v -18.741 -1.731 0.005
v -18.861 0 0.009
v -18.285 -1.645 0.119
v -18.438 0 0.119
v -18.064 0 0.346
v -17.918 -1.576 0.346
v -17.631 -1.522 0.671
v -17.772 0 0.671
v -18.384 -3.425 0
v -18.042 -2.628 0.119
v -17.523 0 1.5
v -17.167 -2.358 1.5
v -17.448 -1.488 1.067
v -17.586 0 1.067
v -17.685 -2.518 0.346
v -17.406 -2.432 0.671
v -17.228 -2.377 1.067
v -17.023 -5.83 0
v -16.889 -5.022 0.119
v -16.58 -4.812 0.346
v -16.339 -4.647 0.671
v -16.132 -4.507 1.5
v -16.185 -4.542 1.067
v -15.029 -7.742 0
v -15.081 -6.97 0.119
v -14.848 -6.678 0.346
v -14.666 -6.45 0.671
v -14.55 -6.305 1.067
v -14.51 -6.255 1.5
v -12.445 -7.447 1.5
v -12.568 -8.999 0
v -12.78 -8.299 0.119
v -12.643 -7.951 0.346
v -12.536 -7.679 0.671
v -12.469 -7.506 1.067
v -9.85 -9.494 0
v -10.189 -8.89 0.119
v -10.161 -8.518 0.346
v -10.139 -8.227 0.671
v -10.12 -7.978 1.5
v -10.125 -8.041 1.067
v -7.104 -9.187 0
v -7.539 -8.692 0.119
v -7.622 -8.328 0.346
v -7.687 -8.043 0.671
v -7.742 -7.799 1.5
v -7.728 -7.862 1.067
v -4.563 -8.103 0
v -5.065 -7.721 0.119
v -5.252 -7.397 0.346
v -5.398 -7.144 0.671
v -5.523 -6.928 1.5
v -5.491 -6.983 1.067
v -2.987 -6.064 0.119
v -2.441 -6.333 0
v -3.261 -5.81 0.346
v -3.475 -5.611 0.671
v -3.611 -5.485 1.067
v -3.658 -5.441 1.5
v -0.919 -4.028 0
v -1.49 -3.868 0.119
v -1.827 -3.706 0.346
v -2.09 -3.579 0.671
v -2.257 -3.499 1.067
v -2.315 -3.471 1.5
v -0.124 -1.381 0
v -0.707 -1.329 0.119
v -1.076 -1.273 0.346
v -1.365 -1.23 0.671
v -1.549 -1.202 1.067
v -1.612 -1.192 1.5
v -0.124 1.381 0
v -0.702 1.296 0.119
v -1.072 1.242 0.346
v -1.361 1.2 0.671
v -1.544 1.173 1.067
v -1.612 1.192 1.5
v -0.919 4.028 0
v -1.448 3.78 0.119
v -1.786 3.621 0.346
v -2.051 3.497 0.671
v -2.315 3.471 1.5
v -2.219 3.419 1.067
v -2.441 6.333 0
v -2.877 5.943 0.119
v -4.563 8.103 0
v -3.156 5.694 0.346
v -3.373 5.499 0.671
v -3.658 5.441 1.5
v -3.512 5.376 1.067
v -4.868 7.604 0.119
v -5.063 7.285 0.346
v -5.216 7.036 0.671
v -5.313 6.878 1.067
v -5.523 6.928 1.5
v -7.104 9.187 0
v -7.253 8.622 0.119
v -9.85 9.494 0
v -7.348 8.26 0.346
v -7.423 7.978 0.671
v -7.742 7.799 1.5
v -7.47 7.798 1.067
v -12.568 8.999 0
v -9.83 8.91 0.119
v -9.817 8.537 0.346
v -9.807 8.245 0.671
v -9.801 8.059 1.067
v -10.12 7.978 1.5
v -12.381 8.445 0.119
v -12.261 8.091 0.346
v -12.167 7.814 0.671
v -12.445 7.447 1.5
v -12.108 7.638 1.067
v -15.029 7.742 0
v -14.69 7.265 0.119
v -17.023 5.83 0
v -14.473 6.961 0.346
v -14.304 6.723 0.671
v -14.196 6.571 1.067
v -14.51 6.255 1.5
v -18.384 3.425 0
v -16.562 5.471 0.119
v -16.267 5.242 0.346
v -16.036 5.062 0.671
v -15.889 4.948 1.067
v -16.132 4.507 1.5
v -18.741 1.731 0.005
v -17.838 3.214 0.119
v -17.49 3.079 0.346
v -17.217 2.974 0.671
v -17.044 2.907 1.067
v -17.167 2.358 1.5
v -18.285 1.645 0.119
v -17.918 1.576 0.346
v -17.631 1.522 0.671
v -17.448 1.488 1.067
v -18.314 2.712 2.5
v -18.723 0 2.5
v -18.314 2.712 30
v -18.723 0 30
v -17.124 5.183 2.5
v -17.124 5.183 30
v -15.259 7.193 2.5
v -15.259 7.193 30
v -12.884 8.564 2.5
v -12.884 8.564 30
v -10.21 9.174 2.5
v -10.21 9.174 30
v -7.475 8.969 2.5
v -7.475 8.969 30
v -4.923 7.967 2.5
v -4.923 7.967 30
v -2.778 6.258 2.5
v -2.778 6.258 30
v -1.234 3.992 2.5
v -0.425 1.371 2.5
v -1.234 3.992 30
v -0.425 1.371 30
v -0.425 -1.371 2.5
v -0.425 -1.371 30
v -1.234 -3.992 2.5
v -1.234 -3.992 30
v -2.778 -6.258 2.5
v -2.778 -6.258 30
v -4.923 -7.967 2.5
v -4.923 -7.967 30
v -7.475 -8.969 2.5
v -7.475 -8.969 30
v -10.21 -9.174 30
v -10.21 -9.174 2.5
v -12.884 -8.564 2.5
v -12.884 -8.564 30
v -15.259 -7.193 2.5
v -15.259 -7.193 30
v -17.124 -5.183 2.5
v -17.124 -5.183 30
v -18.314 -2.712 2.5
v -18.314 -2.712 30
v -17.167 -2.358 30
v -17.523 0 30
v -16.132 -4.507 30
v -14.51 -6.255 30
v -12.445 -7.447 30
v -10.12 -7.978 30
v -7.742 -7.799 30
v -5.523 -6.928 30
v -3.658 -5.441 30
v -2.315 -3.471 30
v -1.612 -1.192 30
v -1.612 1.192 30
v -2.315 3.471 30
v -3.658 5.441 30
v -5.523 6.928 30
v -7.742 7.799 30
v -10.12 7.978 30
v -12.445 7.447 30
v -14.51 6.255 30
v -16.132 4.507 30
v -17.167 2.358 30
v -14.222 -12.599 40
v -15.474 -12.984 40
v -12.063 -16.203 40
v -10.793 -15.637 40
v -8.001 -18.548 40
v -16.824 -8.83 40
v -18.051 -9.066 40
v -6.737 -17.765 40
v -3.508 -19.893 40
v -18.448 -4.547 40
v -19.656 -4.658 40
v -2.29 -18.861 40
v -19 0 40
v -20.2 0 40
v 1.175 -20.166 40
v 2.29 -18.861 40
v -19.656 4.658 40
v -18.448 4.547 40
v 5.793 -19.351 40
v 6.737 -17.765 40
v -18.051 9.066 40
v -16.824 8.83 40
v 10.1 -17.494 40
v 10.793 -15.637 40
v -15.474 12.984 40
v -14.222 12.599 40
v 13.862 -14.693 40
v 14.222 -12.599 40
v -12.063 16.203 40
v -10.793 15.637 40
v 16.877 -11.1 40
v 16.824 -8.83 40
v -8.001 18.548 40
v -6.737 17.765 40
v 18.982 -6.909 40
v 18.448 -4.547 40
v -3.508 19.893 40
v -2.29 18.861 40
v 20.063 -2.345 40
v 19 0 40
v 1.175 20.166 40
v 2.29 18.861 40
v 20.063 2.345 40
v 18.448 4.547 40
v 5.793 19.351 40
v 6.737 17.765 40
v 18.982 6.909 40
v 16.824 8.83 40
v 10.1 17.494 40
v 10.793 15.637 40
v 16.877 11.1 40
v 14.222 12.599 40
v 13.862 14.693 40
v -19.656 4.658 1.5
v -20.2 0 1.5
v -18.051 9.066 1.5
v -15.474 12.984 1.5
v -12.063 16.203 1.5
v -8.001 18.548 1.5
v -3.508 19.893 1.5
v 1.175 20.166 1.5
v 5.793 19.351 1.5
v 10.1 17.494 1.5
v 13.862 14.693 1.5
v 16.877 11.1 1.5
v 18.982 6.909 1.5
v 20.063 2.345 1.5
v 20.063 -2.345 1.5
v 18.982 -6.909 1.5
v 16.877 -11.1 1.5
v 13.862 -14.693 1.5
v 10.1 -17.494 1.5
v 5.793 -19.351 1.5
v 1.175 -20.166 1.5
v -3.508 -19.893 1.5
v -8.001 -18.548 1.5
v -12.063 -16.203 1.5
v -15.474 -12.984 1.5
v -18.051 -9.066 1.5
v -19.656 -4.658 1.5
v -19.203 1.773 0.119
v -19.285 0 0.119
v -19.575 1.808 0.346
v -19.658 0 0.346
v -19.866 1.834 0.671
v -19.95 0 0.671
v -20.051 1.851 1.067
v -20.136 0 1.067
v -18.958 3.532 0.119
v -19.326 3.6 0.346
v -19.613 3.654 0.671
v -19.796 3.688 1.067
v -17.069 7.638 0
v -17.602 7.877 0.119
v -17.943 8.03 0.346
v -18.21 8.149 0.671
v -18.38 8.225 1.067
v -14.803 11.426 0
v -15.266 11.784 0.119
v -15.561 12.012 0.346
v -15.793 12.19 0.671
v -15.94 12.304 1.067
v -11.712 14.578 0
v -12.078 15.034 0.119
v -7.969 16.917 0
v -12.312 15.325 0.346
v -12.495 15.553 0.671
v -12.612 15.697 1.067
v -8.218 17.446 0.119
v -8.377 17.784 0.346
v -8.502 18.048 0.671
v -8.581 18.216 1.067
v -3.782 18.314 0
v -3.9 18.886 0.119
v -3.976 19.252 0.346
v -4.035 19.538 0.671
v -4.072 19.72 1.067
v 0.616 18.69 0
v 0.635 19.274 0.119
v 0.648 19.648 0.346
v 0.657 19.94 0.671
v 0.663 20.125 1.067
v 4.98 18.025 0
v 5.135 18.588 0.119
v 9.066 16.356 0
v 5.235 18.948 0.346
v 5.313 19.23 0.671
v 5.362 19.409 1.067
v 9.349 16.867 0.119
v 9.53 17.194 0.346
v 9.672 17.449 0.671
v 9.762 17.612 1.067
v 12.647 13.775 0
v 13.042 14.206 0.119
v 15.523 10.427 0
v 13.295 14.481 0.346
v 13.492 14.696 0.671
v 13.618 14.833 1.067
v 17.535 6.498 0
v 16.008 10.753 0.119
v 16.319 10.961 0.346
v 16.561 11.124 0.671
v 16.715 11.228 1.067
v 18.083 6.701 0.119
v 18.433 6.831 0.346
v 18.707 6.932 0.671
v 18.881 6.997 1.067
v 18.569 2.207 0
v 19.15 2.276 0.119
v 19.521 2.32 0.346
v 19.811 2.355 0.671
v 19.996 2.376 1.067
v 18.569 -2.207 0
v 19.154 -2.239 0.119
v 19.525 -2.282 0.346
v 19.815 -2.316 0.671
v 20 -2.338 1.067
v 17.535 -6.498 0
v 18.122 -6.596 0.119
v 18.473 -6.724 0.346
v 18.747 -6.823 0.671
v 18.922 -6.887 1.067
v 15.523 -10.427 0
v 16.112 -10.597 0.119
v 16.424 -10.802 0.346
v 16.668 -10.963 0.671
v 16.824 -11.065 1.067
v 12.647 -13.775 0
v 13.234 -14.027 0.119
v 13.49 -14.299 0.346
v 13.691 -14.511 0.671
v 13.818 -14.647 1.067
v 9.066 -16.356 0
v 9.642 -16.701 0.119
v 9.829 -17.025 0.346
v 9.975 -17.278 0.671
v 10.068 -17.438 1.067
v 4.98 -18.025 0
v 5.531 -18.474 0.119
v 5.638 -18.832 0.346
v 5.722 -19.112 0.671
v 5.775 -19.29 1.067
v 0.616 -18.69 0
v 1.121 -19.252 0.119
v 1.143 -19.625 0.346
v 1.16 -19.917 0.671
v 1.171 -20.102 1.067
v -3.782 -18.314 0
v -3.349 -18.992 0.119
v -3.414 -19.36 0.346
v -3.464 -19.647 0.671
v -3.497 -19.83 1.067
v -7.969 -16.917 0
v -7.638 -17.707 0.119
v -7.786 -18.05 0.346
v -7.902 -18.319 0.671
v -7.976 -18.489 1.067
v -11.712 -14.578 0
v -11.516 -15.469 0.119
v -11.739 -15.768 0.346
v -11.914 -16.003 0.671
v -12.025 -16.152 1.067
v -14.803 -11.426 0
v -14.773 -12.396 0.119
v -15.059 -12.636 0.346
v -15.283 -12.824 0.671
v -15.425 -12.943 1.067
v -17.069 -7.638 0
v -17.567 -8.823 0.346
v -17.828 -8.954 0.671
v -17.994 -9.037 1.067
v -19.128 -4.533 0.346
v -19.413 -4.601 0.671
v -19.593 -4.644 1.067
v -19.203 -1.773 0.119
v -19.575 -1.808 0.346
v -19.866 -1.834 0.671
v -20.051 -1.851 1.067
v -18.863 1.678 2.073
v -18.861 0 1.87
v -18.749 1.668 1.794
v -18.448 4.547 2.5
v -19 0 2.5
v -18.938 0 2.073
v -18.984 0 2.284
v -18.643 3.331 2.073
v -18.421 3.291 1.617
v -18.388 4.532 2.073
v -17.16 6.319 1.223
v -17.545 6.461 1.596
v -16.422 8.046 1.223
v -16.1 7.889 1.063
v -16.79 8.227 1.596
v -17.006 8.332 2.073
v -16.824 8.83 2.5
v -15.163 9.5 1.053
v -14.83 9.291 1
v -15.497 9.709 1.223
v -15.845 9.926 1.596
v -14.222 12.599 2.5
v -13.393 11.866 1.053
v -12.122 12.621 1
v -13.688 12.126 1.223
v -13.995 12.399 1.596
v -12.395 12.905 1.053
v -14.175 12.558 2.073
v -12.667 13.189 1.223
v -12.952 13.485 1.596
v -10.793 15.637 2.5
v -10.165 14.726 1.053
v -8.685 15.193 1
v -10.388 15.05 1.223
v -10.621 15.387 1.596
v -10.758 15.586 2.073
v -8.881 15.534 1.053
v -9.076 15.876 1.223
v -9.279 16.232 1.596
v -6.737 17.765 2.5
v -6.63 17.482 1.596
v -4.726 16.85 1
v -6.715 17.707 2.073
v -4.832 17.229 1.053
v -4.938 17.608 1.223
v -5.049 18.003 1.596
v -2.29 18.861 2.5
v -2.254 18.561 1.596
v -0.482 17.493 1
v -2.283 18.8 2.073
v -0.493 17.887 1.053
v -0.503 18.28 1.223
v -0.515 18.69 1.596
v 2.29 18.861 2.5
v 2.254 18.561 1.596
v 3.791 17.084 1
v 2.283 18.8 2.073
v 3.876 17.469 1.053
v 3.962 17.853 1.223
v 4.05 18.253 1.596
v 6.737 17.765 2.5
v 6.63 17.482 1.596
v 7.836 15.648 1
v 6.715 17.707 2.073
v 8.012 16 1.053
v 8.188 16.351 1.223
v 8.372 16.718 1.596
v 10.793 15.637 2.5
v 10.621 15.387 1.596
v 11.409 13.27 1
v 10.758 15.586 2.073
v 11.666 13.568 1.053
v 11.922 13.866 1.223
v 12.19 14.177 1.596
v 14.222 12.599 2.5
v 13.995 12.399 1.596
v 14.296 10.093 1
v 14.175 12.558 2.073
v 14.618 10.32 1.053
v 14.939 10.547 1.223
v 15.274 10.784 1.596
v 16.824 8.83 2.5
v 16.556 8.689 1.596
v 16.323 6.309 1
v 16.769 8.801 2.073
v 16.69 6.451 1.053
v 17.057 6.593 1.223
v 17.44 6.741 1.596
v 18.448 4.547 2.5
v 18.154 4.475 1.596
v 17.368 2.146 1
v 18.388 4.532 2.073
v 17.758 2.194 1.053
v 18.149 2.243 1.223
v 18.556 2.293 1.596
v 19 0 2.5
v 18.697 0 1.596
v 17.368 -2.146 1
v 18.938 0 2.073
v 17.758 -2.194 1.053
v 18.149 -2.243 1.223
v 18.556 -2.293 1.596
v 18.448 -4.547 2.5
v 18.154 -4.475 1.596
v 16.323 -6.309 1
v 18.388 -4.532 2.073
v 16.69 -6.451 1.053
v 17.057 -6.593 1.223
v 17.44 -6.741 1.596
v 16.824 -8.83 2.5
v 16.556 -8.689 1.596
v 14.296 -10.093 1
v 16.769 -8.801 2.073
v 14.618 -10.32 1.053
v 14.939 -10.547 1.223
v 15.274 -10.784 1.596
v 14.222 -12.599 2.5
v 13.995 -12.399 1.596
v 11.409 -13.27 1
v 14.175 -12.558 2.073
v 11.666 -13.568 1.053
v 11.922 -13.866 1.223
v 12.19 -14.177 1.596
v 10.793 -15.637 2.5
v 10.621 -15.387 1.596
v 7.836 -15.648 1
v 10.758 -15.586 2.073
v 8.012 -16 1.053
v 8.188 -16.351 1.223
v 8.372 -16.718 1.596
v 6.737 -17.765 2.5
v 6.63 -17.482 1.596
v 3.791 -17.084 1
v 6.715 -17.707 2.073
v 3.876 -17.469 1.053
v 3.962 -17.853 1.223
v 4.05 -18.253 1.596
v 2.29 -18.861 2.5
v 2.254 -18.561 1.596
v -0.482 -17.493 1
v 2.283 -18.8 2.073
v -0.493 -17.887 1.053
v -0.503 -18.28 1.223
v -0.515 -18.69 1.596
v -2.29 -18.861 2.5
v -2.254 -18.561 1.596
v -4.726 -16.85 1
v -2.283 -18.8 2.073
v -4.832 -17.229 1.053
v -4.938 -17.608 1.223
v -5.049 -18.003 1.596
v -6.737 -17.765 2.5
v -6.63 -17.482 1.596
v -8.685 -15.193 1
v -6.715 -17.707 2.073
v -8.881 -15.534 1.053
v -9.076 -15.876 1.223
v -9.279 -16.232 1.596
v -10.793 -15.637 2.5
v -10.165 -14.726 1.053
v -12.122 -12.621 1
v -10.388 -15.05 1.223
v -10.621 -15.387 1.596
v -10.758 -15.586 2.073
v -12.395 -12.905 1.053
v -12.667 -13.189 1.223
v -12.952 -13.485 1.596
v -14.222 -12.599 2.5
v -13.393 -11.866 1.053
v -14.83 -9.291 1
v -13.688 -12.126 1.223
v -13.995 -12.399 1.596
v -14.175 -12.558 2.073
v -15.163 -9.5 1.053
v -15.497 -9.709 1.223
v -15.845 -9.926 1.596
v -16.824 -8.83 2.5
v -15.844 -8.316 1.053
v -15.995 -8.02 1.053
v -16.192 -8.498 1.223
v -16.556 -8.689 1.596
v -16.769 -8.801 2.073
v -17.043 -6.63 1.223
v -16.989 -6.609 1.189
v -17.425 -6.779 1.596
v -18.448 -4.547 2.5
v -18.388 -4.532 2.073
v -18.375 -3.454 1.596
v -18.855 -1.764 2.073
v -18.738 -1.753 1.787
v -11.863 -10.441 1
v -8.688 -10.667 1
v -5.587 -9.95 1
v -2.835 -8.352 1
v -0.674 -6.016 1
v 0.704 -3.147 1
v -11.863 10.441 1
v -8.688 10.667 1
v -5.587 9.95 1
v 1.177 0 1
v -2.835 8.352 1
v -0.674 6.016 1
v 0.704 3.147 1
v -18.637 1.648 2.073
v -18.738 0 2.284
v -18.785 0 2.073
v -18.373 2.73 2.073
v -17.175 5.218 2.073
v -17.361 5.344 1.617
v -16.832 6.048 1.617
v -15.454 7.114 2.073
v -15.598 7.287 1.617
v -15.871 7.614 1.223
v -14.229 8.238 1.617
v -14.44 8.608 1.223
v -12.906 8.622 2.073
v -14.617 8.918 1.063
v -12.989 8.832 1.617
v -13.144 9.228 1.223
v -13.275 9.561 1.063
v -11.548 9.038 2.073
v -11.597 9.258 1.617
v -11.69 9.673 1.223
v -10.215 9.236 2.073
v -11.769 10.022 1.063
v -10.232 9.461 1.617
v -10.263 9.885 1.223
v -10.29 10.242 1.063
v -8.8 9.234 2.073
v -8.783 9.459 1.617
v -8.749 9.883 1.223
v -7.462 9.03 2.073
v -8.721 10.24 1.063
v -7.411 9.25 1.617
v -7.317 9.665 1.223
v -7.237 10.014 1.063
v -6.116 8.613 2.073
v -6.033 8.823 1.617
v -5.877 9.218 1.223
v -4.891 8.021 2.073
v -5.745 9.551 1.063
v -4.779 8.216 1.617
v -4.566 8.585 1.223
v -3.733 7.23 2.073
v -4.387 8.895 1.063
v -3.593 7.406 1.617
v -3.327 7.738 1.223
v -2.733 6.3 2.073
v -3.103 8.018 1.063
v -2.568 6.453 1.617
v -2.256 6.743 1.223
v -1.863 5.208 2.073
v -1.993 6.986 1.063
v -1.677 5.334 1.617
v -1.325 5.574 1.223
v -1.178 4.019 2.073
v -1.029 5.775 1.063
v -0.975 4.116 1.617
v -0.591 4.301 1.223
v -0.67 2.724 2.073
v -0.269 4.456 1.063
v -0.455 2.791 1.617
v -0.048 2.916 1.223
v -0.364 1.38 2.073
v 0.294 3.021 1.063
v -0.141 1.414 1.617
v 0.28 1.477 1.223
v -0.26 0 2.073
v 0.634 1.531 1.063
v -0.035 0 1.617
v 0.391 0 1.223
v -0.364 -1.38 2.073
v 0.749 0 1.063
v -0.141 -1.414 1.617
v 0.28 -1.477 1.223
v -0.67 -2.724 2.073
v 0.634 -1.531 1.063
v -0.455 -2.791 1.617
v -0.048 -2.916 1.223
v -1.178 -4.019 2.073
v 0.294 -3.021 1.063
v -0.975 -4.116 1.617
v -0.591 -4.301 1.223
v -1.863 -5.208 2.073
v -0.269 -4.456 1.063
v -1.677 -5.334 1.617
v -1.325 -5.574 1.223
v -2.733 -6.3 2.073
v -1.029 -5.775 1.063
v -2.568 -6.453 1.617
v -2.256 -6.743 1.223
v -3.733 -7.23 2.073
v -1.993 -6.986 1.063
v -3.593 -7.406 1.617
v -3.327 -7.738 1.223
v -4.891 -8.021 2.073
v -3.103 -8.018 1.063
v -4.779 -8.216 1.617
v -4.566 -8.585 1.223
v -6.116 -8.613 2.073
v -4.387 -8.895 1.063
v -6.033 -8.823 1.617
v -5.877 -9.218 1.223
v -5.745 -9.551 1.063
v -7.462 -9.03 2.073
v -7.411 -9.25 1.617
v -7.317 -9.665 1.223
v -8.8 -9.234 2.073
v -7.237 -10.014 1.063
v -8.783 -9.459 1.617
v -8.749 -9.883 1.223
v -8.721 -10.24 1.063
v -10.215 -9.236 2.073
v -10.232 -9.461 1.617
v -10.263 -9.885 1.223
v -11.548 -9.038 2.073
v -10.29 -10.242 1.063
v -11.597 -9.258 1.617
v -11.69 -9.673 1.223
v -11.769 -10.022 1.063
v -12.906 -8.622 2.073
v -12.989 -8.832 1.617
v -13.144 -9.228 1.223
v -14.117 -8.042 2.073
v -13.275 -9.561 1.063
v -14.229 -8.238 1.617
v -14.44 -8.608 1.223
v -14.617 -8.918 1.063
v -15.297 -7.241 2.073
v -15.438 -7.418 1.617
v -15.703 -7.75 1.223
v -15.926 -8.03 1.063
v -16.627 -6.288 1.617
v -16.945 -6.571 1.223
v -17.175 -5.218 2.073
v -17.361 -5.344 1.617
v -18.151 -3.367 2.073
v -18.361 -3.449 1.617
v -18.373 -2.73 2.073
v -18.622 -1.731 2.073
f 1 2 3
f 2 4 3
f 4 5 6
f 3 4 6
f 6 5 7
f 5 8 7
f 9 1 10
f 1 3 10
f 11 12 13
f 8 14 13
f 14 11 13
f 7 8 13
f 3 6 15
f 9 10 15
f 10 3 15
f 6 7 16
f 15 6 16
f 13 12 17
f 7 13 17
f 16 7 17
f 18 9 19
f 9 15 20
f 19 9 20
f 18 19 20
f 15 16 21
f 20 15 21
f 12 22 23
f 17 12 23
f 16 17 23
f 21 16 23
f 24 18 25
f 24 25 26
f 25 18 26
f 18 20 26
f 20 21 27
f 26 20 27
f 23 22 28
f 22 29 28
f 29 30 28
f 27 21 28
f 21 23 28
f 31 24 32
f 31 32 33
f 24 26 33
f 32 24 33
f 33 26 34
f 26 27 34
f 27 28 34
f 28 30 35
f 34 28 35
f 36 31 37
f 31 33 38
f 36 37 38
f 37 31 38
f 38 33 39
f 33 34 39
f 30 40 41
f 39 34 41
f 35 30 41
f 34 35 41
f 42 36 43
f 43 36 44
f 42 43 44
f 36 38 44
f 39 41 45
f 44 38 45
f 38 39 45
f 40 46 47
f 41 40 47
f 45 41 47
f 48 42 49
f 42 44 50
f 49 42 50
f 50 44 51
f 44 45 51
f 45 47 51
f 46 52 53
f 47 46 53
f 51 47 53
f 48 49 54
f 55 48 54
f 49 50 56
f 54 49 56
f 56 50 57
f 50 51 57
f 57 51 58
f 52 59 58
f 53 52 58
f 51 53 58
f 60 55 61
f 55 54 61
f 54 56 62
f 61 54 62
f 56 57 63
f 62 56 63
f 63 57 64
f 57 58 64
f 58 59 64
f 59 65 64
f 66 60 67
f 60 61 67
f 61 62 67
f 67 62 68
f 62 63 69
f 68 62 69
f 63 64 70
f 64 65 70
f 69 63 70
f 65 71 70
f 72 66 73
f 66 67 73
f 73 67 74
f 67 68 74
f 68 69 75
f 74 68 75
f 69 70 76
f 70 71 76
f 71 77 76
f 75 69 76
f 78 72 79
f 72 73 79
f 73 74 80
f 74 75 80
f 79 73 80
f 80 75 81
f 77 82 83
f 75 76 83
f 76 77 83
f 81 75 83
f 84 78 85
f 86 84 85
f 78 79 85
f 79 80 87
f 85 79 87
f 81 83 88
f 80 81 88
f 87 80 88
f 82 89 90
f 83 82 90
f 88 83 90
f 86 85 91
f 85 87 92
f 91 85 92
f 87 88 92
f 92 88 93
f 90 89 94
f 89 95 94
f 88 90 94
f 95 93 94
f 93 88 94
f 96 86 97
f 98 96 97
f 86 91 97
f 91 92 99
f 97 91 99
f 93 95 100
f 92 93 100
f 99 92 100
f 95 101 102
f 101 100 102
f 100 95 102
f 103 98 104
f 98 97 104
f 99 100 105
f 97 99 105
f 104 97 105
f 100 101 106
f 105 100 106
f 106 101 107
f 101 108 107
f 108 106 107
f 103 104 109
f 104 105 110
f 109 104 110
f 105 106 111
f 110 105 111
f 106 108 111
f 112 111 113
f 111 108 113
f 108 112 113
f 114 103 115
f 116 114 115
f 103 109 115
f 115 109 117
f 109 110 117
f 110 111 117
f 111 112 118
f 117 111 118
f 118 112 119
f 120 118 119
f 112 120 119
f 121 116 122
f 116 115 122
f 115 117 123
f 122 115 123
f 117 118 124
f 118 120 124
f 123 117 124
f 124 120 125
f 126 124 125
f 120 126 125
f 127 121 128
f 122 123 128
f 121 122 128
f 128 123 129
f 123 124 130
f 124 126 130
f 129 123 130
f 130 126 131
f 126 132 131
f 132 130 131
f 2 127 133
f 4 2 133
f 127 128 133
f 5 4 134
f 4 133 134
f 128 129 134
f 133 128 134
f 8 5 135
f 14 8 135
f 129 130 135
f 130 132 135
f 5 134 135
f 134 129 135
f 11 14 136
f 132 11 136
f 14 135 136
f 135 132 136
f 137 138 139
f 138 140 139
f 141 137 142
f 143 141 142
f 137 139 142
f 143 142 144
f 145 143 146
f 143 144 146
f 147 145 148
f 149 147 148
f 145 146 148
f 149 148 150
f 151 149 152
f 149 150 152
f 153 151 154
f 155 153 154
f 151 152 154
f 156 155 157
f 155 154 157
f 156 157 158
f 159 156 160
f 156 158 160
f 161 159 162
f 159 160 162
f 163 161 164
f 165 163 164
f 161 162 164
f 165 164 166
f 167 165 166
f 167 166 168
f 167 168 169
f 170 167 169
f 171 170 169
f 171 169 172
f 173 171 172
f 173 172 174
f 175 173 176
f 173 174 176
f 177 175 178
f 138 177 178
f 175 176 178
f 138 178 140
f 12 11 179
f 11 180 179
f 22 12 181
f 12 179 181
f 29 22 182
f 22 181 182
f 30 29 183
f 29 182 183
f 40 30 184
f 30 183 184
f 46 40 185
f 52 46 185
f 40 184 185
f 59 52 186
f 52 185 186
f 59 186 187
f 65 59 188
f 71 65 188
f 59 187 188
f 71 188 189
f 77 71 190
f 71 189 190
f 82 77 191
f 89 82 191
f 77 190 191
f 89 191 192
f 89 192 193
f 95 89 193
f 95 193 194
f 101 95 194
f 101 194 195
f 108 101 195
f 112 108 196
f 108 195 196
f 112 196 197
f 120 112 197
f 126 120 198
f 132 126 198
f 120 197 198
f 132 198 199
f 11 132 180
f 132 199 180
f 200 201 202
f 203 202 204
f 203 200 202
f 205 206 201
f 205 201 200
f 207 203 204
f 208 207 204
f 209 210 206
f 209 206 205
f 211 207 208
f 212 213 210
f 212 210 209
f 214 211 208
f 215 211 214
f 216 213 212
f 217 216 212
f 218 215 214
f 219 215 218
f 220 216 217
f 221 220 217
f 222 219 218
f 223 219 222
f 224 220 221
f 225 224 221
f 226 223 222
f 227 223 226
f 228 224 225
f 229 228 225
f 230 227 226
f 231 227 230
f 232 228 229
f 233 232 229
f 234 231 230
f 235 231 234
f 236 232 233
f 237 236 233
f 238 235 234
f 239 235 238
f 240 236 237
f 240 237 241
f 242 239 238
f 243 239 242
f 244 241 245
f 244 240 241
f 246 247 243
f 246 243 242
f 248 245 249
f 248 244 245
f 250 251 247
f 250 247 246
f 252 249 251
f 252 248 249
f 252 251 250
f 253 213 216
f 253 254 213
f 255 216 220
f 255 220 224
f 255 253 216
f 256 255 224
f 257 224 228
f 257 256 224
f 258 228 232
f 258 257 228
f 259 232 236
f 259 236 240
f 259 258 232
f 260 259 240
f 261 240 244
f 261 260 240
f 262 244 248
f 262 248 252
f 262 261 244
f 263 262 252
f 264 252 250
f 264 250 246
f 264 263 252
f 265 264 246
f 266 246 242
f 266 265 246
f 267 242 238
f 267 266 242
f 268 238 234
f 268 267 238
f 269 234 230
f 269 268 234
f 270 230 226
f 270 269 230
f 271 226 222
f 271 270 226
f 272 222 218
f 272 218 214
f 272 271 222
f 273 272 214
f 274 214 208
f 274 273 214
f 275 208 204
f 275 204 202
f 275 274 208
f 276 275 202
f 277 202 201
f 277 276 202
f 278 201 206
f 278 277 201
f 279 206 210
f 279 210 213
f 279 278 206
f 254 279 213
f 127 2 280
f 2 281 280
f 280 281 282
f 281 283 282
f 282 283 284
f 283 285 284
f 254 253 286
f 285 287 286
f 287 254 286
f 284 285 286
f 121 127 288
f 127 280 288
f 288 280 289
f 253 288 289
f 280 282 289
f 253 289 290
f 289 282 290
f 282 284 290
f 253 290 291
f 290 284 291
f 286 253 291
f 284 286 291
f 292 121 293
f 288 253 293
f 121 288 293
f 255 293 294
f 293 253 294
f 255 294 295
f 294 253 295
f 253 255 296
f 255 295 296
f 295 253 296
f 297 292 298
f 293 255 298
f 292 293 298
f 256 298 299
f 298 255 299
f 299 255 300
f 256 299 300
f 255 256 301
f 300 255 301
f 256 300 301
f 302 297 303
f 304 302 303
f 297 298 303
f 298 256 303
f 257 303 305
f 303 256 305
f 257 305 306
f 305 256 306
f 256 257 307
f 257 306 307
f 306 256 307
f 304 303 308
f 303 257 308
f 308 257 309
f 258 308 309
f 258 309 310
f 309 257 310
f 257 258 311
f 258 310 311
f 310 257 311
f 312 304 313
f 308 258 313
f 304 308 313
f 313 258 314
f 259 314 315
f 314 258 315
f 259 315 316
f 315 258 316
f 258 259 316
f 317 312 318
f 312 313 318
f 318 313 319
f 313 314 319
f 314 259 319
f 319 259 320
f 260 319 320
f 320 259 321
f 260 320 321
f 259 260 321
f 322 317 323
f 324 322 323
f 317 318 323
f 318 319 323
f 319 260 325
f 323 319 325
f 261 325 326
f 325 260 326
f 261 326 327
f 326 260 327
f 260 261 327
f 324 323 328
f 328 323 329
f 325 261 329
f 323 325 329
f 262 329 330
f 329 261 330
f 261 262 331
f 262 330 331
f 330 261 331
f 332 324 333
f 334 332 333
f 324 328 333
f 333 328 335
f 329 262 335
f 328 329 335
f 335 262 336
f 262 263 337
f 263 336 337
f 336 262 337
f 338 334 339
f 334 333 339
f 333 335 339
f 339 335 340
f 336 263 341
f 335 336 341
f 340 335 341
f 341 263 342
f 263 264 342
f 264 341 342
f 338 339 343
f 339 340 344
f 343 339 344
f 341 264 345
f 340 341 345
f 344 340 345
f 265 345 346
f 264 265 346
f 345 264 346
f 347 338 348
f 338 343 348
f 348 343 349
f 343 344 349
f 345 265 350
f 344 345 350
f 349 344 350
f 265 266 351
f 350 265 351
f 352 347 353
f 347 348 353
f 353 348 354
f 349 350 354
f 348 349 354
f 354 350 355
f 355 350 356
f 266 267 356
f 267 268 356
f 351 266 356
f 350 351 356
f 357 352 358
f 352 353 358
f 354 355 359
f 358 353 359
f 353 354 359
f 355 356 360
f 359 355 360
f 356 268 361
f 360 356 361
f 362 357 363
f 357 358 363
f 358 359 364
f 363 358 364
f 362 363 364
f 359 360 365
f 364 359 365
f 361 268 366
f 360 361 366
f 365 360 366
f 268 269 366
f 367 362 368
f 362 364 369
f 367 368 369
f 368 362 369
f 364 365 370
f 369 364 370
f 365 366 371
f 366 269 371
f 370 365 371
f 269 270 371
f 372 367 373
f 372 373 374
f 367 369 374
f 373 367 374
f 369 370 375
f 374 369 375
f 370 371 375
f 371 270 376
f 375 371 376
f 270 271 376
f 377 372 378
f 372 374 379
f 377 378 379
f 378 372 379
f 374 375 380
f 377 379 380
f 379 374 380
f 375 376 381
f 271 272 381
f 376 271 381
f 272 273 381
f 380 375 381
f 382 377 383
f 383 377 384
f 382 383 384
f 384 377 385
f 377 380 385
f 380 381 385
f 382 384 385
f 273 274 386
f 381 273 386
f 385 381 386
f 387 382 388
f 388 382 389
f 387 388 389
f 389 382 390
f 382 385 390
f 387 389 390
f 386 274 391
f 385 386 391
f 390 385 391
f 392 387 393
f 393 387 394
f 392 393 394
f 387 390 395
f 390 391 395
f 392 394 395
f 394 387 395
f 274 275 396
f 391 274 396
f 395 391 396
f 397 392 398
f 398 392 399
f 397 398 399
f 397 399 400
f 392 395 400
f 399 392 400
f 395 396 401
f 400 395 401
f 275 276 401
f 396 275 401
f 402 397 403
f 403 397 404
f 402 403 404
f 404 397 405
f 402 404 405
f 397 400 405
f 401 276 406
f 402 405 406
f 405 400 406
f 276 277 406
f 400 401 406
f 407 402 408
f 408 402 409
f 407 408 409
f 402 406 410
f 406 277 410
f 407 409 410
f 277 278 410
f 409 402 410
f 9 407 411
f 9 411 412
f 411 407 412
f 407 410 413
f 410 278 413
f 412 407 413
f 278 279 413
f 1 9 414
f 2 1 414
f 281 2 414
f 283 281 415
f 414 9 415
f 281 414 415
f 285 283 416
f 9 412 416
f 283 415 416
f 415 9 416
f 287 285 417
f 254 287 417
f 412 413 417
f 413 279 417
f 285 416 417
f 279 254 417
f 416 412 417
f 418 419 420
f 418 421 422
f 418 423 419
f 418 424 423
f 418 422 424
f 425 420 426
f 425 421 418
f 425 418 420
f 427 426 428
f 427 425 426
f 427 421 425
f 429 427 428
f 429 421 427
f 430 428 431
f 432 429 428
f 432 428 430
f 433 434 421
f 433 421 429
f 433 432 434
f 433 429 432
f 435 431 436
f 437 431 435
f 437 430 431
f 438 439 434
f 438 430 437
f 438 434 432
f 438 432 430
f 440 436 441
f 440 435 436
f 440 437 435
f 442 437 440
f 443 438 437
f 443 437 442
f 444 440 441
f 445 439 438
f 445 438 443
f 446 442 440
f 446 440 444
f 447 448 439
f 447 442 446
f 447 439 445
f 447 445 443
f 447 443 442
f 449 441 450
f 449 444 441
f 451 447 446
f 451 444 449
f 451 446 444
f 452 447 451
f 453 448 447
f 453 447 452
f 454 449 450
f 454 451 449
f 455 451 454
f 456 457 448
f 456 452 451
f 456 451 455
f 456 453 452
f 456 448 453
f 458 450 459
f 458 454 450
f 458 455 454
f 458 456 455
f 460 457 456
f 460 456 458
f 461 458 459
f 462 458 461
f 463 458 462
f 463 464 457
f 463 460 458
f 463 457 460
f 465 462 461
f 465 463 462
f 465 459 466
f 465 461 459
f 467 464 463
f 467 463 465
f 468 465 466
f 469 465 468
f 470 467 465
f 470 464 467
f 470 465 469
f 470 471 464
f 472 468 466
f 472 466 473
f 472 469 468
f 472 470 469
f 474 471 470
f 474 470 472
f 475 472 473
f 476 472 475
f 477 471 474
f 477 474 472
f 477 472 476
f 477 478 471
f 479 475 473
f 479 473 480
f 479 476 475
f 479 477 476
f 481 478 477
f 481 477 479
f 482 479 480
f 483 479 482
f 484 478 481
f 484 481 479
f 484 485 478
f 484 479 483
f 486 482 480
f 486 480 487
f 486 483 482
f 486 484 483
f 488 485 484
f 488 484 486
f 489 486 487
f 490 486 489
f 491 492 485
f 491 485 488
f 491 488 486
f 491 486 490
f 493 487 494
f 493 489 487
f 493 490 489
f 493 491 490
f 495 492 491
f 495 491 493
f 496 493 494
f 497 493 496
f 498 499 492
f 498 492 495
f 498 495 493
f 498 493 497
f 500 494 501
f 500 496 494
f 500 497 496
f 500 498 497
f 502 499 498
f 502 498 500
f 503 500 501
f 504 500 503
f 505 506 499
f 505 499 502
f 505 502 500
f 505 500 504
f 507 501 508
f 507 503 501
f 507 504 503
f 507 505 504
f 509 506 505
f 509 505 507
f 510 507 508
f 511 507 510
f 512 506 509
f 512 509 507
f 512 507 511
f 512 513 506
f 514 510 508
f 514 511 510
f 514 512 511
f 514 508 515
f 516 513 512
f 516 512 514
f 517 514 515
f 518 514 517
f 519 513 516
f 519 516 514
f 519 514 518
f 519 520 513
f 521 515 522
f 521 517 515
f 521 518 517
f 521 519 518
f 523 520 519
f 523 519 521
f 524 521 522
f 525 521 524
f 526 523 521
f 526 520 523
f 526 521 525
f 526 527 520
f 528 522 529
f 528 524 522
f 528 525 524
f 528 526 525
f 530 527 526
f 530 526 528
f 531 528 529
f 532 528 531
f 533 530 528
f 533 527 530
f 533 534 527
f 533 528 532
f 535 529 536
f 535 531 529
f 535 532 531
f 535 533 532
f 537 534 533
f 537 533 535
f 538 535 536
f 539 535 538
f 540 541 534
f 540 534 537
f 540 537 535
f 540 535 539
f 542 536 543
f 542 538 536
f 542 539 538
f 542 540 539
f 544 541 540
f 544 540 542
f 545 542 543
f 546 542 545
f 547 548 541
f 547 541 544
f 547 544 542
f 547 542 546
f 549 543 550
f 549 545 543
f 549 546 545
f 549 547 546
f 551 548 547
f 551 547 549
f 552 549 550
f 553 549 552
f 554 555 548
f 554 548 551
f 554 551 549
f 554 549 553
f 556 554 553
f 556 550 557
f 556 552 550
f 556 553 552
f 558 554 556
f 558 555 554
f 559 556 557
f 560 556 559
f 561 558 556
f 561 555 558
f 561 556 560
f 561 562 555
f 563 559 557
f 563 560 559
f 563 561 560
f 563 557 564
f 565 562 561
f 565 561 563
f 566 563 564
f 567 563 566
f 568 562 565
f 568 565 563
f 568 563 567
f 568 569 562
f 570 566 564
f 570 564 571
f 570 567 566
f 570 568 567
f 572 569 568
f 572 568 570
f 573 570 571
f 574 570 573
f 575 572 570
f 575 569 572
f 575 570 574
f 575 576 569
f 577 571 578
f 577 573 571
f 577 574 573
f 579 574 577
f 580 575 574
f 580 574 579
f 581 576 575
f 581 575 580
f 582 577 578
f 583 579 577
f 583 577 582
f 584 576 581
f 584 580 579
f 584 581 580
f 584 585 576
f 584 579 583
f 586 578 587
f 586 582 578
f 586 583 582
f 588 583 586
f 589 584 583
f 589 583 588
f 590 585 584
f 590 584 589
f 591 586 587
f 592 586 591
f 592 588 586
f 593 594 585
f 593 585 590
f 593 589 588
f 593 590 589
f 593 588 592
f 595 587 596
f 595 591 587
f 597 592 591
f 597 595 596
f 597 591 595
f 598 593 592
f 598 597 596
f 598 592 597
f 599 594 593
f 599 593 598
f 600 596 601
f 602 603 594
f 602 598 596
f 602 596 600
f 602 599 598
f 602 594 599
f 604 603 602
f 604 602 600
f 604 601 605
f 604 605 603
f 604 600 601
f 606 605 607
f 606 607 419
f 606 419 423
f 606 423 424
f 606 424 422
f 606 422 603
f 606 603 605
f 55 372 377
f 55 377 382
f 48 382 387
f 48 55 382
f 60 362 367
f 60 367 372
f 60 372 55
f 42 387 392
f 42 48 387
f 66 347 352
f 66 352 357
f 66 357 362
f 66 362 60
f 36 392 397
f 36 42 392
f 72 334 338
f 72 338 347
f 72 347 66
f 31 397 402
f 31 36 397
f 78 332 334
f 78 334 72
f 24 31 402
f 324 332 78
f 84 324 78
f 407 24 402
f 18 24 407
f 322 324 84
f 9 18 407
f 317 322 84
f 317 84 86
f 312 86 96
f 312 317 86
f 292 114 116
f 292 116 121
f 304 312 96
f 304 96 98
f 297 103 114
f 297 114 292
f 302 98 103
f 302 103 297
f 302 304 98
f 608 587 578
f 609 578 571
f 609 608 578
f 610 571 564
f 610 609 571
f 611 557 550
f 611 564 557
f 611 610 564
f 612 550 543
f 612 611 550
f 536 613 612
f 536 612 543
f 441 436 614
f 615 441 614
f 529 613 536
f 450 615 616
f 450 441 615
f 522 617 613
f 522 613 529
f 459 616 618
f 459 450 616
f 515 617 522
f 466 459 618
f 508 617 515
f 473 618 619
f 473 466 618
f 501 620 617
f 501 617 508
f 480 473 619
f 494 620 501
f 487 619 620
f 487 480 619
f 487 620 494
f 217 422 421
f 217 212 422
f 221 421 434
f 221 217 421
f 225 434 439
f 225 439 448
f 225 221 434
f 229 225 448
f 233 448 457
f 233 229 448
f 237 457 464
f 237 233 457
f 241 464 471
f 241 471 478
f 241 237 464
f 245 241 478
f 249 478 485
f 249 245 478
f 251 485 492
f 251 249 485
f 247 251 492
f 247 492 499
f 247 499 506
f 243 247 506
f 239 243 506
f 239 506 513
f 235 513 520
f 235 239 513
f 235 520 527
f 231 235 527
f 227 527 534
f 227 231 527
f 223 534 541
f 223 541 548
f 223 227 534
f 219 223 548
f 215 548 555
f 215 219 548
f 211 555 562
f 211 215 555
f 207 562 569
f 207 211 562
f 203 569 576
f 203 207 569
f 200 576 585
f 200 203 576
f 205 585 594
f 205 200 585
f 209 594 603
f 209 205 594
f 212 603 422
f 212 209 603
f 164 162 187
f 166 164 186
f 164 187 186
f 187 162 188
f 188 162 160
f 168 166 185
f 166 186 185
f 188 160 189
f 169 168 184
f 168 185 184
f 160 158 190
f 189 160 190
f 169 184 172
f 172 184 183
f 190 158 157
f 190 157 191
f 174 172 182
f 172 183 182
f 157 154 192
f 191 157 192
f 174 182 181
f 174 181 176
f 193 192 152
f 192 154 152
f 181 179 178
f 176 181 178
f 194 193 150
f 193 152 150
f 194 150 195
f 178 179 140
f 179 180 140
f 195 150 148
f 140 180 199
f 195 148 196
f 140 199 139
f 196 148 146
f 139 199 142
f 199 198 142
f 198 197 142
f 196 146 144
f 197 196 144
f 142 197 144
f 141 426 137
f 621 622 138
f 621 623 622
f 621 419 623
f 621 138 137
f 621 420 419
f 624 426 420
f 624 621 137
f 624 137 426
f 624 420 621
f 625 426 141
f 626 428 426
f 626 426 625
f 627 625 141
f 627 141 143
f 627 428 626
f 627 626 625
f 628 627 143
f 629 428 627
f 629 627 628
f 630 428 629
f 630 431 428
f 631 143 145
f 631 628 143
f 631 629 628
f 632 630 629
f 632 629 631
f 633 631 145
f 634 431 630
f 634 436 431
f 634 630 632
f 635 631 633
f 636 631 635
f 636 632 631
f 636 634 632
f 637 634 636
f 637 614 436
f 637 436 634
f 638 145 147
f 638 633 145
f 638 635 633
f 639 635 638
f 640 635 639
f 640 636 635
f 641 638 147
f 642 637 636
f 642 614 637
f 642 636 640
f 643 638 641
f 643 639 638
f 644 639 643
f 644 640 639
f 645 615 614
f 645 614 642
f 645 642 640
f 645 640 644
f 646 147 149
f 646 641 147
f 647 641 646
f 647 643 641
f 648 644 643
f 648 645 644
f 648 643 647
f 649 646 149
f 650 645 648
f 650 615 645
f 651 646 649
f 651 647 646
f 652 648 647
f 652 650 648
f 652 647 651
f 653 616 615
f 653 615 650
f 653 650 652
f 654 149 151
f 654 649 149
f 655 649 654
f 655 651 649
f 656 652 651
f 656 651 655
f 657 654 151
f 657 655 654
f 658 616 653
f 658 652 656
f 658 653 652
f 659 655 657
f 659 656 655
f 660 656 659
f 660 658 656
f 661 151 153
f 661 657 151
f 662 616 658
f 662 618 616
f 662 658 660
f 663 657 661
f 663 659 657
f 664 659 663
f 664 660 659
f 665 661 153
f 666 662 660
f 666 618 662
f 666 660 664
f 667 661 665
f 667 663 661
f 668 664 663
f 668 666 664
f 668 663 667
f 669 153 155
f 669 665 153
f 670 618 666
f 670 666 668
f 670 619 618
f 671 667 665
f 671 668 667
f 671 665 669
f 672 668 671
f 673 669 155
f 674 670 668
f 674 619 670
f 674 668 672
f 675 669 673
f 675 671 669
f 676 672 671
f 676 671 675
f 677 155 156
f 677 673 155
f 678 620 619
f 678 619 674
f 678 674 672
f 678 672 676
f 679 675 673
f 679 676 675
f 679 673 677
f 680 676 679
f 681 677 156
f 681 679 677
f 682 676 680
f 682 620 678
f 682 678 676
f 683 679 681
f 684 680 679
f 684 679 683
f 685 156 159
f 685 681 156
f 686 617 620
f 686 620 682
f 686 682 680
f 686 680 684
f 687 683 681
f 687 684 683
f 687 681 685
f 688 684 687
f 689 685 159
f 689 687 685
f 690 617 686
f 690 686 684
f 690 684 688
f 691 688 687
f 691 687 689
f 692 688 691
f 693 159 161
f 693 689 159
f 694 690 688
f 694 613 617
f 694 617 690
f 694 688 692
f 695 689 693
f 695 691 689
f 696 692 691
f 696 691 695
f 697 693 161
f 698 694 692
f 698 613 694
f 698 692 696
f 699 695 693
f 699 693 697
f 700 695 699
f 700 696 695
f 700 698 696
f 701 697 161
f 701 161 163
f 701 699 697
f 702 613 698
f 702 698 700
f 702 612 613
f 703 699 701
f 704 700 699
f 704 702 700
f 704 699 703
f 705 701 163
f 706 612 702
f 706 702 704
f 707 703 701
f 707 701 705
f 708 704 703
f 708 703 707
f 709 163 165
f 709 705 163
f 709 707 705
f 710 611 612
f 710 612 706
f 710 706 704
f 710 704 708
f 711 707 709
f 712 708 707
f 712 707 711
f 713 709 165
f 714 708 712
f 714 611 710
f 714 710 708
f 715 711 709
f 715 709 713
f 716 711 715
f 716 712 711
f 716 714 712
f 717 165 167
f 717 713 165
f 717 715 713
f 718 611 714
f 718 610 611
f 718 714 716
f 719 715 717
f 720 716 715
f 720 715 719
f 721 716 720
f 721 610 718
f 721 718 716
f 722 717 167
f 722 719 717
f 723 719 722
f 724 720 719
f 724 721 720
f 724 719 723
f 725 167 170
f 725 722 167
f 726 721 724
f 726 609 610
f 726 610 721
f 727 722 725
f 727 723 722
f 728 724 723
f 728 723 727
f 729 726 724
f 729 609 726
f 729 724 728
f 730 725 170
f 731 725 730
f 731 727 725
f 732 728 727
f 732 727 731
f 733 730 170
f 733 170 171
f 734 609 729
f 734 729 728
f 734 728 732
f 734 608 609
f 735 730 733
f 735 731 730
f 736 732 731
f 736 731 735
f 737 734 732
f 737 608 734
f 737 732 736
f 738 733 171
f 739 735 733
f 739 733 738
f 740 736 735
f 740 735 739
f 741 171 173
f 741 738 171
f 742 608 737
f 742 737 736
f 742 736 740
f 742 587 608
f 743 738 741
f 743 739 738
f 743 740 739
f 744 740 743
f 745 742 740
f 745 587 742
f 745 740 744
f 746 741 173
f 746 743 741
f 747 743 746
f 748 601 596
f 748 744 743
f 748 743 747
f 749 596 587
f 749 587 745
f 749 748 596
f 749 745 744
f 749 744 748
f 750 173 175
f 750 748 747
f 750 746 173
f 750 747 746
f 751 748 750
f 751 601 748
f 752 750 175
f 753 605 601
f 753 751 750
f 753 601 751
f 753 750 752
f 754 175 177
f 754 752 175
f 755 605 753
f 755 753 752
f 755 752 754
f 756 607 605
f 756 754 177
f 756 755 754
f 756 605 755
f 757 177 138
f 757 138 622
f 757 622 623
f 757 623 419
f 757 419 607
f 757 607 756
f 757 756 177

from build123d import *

# Parameters (mm, degrees)
F2_W     = 1.2
F2_H     = 30
F4_DEPTH = 12.5


# Not quite as in the source:
# - a fillet or chamfer that OpenCascade refuses, or shapes differently, is made with other operations: its cross-section is extruded or revolved along the edge and cut away or added


with BuildPart() as f1:
    # F0 (on Front) → F1 (revolve)
    with BuildSketch(Plane.XZ):
        Polygon((-20.2, 0), (0, 0), (0, 1), (-19, 1), (-19, 40), (-20.2, 40), align=None)
    revolve(axis=Axis((0, 0, 0.5), (0, 0, -1)))

    # F2 (on Front) → F3 (revolve)
    with BuildSketch(Plane.XZ):
        with Locations((-18.1225388443, 15)):
            Rectangle(F2_W, F2_H)
    revolve(axis=Axis((-9.5225388443, 0, 9.0516569445), (0, 0, -1)))

    # F4 (cut, symmetric): a face of the model
    f4_faces = [f1.faces().sort_by_distance(p)[0] for p in [
        (-9.5225388443, 0, 1),
    ]]
    extrude(f4_faces, amount=F4_DEPTH, both=True, mode=Mode.SUBTRACT)

    # F5: fillet of radius 1.5 on 4 edges, made by hand

    # F5_s1 → F5_t2 (revolve)
    with BuildSketch(Plane.XZ):
        with BuildLine():
            ThreePointArc((-17.5, 1), (-18.5606601718, 1.4393398282), (-19, 2.5))
            Line((-19, 2.5), (-19.03, 2.5))
            Line((-19.03, 2.5), (-19.03, 0.97))
            Line((-19.03, 0.97), (-17.5, 0.97))
            Line((-17.5, 0.97), (-17.5, 1))
        make_face()
    revolve(axis=Axis((0, 0, 1), (0, 0, -1)))

    # F5_s3 → F5_t4 (revolve)
    with BuildSketch(Plane.XZ):
        with BuildLine():
            ThreePointArc((-18.7225388443, 2.5), (-19.1618786725, 1.4393398282), (-20.2225388443, 1))
            Line((-20.2225388443, 1), (-20.2225388443, 0.97))
            Line((-20.2225388443, 0.97), (-18.6925388443, 0.97))
            Line((-18.6925388443, 0.97), (-18.6925388443, 2.5))
            Line((-18.6925388443, 2.5), (-18.7225388443, 2.5))
        make_face()
    revolve(axis=Axis((-9.5225388443, 0, 1), (0, 0, -1)))

    # F5_s5 → F5_t6 (revolve, cut)
    with BuildSketch(Plane.XZ):
        with BuildLine():
            ThreePointArc((-18.7, 0), (-19.7606601718, 0.4393398282), (-20.2, 1.5))
            Line((-20.2, 1.5), (-20.23, 1.5))
            Line((-20.23, 1.5), (-20.23, -0.03))
            Line((-20.23, -0.03), (-18.7, -0.03))
            Line((-18.7, -0.03), (-18.7, 0))
        make_face()
    revolve(axis=Axis((0, 0, 0), (0, 0, -1)), mode=Mode.SUBTRACT)

    # F5_s7 → F5_t8 (revolve, cut)
    with BuildSketch(Plane.XZ):
        with BuildLine():
            ThreePointArc((-19.0225388443, 0), (-17.9618786725, 0.4393398282), (-17.5225388443, 1.5))
            Line((-17.5225388443, 1.5), (-17.4925388443, 1.5))
            Line((-17.4925388443, 1.5), (-17.4925388443, -0.03))
            Line((-17.4925388443, -0.03), (-19.0225388443, -0.03))
            Line((-19.0225388443, -0.03), (-19.0225388443, 0))
        make_face()
    revolve(axis=Axis((-9.5225388443, 0, 0), (0, 0, 1)), mode=Mode.SUBTRACT)


solid = f1.part
